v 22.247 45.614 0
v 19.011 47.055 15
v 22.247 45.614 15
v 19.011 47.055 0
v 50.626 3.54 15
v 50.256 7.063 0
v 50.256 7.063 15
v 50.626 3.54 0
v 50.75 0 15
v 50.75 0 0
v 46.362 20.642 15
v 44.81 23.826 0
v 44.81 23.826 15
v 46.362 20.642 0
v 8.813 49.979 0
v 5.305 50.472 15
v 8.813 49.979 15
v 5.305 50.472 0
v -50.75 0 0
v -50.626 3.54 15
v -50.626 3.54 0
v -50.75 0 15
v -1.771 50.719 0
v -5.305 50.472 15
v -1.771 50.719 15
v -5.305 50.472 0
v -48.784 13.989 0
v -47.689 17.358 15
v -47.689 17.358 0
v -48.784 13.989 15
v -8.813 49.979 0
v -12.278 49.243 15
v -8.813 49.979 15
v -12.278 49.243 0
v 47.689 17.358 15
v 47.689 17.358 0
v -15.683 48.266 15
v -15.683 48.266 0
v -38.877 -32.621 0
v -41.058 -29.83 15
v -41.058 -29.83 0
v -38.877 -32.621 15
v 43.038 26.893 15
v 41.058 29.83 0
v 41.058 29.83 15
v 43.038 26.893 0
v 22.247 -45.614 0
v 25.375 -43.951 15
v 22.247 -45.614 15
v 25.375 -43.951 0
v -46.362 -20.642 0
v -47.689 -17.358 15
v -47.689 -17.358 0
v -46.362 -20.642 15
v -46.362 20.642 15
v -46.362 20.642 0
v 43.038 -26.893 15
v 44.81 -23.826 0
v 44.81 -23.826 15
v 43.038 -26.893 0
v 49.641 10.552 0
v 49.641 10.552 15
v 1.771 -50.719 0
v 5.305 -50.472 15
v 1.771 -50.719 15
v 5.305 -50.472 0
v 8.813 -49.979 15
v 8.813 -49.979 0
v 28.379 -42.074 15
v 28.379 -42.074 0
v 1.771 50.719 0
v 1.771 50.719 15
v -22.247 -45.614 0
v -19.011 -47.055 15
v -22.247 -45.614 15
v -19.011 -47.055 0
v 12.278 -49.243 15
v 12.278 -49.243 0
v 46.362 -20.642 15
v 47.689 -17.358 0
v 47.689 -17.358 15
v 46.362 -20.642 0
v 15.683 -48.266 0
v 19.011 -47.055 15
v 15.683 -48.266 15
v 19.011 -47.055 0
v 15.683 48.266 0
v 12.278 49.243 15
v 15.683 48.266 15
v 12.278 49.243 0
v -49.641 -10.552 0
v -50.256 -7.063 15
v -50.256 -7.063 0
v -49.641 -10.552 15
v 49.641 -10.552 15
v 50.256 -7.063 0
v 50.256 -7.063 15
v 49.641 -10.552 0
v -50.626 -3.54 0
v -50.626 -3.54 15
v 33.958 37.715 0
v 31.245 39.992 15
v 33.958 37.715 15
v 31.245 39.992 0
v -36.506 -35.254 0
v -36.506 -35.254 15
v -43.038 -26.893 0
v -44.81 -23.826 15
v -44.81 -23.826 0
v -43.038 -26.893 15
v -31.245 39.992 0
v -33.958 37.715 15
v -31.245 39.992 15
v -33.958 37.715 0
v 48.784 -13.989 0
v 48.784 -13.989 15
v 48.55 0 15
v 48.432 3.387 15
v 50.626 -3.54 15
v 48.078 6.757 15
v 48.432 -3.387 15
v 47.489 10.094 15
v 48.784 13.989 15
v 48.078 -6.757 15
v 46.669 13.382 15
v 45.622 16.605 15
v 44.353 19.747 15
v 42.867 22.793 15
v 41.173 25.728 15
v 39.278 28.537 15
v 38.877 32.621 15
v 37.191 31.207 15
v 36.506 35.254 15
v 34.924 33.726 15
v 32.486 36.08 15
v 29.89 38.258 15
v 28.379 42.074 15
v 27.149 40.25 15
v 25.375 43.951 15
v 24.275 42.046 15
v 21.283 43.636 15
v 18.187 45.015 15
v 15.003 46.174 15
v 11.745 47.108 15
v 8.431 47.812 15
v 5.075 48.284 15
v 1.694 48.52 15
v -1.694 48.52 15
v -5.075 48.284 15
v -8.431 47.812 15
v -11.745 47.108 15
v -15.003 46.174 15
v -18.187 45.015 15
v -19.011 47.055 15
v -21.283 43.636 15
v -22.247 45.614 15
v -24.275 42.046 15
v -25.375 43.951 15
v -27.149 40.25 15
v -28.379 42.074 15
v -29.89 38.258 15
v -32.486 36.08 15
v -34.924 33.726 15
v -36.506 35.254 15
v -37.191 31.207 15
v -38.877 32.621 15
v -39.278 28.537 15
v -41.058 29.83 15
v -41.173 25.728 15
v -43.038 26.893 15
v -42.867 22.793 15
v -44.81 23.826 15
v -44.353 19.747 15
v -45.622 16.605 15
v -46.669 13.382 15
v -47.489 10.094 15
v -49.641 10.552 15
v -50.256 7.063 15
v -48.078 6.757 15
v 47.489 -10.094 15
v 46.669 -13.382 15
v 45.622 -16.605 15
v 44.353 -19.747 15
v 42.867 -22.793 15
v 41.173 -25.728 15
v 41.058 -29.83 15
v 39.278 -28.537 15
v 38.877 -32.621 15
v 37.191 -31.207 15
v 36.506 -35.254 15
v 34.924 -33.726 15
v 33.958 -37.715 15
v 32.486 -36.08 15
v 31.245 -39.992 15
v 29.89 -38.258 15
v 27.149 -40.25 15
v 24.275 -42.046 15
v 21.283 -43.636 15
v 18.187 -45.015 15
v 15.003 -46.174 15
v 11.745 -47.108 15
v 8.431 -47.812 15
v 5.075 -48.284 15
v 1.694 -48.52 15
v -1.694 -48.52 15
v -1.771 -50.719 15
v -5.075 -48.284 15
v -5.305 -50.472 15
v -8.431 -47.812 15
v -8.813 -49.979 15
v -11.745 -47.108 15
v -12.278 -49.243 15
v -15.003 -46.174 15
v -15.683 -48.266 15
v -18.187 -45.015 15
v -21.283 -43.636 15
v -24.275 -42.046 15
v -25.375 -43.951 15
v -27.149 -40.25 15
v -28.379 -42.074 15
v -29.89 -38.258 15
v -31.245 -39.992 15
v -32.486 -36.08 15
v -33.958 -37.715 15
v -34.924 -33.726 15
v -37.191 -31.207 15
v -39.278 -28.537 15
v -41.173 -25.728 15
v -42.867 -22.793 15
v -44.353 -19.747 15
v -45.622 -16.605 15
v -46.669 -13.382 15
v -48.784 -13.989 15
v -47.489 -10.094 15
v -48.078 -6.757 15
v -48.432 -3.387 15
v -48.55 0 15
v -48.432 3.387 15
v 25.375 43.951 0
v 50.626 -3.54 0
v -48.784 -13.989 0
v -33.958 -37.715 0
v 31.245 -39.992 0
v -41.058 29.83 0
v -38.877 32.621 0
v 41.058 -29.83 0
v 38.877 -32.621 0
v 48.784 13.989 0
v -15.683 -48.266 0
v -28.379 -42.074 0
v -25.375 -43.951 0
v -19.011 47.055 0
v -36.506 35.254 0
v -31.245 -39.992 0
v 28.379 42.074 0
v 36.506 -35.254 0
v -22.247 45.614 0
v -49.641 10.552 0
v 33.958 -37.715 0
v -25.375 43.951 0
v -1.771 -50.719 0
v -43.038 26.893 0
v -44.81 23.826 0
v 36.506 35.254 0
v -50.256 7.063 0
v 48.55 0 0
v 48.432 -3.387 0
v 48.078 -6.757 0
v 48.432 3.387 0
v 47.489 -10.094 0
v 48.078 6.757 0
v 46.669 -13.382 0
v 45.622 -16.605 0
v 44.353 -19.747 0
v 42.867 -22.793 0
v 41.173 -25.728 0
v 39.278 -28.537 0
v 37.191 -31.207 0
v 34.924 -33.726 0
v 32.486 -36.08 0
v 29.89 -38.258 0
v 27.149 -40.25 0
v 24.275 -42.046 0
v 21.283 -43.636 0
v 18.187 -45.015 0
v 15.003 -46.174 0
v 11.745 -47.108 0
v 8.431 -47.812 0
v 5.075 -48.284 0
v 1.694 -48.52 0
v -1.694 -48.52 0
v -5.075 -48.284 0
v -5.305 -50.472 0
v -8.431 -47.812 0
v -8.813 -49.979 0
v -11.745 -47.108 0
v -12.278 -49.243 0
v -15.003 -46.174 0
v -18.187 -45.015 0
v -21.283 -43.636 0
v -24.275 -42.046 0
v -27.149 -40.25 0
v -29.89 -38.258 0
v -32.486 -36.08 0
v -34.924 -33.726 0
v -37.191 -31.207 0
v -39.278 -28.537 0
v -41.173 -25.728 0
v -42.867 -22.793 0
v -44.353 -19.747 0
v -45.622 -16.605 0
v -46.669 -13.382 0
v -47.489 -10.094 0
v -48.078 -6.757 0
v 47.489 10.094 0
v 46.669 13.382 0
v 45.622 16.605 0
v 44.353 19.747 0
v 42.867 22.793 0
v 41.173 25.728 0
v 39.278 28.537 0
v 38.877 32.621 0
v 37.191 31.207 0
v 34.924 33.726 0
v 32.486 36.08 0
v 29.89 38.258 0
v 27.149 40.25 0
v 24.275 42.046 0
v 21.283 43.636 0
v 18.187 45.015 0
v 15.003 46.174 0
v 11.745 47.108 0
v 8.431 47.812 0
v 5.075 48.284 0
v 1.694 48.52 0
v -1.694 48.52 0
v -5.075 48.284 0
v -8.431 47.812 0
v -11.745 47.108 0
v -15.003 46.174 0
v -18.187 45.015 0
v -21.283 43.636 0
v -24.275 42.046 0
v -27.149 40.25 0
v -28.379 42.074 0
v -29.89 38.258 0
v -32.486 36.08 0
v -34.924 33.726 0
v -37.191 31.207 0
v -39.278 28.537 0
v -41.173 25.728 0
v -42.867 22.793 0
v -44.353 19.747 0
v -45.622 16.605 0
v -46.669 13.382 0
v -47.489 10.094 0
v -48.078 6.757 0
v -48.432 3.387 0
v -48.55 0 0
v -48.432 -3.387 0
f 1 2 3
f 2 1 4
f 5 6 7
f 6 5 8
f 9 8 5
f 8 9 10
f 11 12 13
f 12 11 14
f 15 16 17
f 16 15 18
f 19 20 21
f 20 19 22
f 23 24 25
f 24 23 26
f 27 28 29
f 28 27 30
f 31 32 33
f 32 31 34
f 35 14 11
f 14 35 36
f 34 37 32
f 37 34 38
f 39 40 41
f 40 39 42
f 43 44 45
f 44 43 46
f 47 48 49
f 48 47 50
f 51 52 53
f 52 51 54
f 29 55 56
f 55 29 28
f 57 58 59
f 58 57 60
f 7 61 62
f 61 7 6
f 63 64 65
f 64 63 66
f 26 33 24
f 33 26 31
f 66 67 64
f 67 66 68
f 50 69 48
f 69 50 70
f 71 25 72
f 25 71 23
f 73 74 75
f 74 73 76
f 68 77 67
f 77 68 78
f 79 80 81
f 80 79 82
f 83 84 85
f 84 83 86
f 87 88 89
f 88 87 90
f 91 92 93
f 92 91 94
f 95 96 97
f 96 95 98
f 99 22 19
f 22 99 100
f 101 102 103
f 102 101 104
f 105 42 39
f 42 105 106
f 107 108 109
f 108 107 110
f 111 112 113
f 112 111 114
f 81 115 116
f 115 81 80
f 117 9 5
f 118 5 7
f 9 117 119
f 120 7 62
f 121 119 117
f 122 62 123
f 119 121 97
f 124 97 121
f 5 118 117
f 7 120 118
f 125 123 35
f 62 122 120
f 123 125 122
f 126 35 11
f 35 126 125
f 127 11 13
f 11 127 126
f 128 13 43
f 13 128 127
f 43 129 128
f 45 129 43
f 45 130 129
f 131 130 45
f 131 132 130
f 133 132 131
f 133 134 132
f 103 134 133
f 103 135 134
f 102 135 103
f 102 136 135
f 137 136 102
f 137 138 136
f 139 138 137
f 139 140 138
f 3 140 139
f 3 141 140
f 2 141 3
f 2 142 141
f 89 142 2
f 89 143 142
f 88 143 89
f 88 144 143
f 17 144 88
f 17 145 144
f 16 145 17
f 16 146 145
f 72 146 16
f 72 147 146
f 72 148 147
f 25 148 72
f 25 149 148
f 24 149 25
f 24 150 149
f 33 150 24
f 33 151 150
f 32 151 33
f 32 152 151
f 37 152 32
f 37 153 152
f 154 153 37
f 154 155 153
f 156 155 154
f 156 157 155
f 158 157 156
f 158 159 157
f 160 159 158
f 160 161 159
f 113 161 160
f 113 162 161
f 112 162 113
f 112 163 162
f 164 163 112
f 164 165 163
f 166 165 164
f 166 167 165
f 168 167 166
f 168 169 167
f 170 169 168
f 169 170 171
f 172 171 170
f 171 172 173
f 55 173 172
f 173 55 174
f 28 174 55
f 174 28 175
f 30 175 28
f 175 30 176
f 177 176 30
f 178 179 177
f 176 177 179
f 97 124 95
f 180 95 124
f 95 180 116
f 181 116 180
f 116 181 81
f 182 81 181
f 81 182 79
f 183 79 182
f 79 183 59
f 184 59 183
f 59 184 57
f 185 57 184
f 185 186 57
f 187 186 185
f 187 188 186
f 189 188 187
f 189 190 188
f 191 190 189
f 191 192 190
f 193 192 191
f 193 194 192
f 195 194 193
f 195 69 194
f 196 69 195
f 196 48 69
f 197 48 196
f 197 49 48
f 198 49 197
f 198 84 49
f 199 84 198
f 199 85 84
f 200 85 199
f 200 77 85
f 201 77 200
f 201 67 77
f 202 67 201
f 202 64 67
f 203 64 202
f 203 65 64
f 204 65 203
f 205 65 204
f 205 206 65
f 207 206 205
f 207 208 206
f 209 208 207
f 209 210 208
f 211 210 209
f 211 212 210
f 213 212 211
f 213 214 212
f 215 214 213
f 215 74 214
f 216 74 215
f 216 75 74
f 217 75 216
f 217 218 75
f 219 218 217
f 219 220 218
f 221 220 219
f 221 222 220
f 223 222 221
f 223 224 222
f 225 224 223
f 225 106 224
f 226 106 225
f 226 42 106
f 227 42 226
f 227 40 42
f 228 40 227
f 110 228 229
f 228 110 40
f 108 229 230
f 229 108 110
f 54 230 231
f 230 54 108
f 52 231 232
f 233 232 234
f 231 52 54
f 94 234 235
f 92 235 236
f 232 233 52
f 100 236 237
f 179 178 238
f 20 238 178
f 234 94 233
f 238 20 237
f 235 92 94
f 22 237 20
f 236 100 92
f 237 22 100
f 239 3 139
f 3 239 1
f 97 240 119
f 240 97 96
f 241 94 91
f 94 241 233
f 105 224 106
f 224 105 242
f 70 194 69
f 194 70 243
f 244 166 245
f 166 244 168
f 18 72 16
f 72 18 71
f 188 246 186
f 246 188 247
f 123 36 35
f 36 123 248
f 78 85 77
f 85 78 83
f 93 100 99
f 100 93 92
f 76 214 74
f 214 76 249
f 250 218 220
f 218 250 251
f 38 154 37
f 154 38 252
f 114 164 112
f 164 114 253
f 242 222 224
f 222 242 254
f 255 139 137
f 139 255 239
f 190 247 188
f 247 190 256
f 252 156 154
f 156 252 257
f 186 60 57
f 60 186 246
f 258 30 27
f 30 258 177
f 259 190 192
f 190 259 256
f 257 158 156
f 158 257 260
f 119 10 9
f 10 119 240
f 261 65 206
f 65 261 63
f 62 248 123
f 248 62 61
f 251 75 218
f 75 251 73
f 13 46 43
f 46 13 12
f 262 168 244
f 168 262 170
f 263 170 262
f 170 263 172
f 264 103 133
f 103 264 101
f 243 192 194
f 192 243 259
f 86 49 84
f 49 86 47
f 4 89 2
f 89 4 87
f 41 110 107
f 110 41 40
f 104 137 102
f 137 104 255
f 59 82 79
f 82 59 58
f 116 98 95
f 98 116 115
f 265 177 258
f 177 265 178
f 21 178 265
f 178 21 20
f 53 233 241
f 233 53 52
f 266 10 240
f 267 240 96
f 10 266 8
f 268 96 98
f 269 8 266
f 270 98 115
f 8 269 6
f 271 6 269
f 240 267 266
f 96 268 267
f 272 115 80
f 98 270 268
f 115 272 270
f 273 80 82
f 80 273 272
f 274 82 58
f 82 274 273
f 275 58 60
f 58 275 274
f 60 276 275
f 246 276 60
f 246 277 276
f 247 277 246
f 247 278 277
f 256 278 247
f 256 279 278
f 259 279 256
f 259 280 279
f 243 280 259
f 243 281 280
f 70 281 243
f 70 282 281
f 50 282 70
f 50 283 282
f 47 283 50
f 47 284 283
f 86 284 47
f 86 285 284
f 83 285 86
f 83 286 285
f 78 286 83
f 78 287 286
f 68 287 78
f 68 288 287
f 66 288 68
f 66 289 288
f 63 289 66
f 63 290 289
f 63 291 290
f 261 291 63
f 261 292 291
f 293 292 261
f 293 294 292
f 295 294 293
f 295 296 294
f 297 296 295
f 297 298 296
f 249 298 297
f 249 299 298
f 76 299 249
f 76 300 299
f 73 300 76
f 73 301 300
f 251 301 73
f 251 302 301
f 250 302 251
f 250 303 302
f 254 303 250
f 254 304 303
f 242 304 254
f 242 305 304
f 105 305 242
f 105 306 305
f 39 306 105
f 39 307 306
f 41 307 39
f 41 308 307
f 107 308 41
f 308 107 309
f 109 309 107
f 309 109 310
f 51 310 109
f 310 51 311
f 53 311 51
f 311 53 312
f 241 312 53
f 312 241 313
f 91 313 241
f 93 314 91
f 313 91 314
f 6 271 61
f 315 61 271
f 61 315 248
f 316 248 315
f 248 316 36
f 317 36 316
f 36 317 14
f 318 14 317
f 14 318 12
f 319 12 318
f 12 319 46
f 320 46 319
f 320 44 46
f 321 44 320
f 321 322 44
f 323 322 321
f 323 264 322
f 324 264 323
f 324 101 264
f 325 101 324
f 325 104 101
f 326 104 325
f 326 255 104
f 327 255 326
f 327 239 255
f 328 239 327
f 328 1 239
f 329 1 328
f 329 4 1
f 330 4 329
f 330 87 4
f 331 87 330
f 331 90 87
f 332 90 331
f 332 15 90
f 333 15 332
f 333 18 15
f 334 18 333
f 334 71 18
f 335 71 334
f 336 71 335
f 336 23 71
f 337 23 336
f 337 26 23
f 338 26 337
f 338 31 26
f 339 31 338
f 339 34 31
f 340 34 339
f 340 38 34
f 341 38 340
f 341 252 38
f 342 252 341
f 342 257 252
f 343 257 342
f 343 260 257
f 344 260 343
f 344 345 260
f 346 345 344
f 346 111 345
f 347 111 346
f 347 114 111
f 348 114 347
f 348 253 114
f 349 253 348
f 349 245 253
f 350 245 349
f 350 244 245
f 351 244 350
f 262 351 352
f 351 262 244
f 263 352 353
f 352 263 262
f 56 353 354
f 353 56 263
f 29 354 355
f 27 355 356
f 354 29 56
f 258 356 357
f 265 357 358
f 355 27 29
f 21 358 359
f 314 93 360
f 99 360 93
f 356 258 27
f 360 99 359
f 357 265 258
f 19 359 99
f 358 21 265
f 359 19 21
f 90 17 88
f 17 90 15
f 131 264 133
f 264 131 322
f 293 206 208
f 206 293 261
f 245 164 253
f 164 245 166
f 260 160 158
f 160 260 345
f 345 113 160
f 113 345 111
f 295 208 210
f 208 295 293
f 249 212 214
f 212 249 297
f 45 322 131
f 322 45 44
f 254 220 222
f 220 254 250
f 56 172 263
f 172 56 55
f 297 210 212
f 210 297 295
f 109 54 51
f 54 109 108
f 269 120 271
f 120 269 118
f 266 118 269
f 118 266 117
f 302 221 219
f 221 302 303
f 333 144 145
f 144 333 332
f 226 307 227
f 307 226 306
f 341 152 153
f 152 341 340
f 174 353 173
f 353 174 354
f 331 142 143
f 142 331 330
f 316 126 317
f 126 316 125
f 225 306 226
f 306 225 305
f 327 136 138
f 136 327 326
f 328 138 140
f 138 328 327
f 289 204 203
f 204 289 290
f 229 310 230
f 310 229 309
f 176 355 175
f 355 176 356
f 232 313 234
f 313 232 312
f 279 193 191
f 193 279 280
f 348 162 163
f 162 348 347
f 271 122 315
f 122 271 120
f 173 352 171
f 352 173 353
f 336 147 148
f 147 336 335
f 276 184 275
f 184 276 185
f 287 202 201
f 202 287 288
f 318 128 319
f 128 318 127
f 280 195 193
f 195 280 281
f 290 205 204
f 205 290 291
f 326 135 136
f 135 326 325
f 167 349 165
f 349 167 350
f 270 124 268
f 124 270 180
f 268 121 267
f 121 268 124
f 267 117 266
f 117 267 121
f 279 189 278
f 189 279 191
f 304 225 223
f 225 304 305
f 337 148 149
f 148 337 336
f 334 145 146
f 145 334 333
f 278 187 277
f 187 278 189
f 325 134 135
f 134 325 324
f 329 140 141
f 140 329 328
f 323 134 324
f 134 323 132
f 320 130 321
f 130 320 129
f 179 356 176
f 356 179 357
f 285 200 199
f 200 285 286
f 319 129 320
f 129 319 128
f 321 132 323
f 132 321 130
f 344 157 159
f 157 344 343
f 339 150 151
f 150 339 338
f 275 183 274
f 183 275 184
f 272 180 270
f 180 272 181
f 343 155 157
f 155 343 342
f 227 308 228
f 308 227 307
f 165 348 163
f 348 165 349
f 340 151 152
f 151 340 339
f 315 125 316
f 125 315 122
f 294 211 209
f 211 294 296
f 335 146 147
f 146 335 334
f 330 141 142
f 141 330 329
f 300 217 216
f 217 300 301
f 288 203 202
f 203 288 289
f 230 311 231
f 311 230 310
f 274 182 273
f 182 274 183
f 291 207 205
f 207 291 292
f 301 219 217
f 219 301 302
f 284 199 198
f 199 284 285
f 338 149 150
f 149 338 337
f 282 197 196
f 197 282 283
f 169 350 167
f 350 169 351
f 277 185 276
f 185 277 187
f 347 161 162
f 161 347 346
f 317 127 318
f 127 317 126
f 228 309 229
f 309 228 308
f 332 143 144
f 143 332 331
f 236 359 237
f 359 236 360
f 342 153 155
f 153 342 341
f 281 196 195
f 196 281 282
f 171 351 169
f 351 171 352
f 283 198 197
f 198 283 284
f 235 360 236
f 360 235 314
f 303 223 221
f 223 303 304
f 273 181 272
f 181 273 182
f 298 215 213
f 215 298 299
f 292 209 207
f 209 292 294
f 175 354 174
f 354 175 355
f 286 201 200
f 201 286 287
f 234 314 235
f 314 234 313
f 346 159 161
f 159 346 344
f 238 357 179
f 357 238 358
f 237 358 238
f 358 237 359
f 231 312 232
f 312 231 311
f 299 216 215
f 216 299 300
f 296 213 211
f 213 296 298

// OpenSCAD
// ***********************************
// Project: 3D Printed Rocket
// Filename: PeregrineNoseCone.scad
// for Apogee Peregrine (100mm body tube)
// Created: 2025-01-19
// Units: mm
// ***********************************
//
// Designed for Bambu P1S (256x256x256mm build volume)
// Two-piece printing supported for lengths > 250mm
//
// ***********************************

include<NoseCone.scad>

// ============================================
// BODY TUBE — measure yours and adjust
// ============================================
Peregrine_Body_OD    = 101.5;   // outside diameter of body tube
Peregrine_Body_ID    = 99.0;    // inside diameter of body tube
Peregrine_Coupler_OD = 97.1;    // shell ID = Body_OD - 2*Wall_T

// ============================================
// NOSE CONE — 550mm exposed, 5.42:1 ogive
// ============================================
// Exposed height = NC_Base_L + NC_Length - X0 + NC_Tip_R.
// The +NC_Tip_R term matters: Tip_Z in BluntOgiveNoseCone is the tip
// SPHERE CENTRE, not the apex. NC_Length=574.55 gives exactly 550.
NC_Length  = 574.55;
NC_Base_L  = 15;
NC_Tip_R   = 8;
NC_Wall_T  = 2.2;
NC_nRivets = 0;   // shoulder is glued via its spigot, not pinned

// Slice planes. Cut_d is a DIAMETER; the module derives Z from it.
Cut1_d = 92.85;   // -> Z = 183.33
Cut2_d = 63.66;   // -> Z = 366.67
Cut1_Z = 183.33;  // clip plane for the middle slice

// ============================================
// SHOULDER — stepped, printed, all-in-one
// ============================================
// Body enters the tube (99.0 ID), spigot enters the shell (97.1 ID).
// Both clearances are 0.4mm diametral.
Shoulder_L         = 100;    // length inside the body tube
// Derived from the body tube ID so a re-measured tube (line 20) can never
// silently produce an interference fit here: 0.4mm diametral clearance.
Shoulder_OD        = Peregrine_Body_ID - 0.4;
Shoulder_Spigot_L  = 15;     // length inside the nosecone skirt
Shoulder_Spigot_OD = 96.7;
Shoulder_Bulk_T    = 4;      // bulkhead thickness, carries the anchor

// ============================================
// GUIDE RINGS — keep the strap off the shell
// ============================================
// OD is the measured flange bore less 0.4-0.5mm diametral clearance.
// Flange bores: 82.47 at joint 1, 52.41 at joint 2.
Ring_T     = 6;
Ring1_OD   = 82.0;
Ring2_OD   = 52.0;
Ring_Eye_d = 12;   // strap pass-through
Ring_Wall  = 4;

// ============================================
// RENDER SELECTION — change this value!
// ============================================
// 0 = Test ring (print first!)
// 1 = Shoulder + bulkhead + parachute anchor
// 2 = Bottom slice
// 3 = Middle slice
// 4 = Top slice (filled tip)
// 5 = Guide ring, lower
// 6 = Guide ring, upper
Render_Part = 0;

// ============================================
// PARTS
// ============================================
module NC_Slice_Bottom(){
    BluntOgiveNoseCone(ID=Peregrine_Coupler_OD, OD=Peregrine_Body_OD,
        L=NC_Length, Base_L=NC_Base_L, nRivets=NC_nRivets,
        Tip_R=NC_Tip_R, Wall_T=NC_Wall_T,
        Cut_d=Cut1_d, LowerPortion=true);
} // NC_Slice_Bottom

module NC_Slice_Middle(){
    // Everything below cut 2 (with its gluing flange), clipped above cut 1.
    // The clean lower cut slides over the bottom slice's flange.
    intersection(){
        BluntOgiveNoseCone(ID=Peregrine_Coupler_OD, OD=Peregrine_Body_OD,
            L=NC_Length, Base_L=NC_Base_L, nRivets=NC_nRivets,
            Tip_R=NC_Tip_R, Wall_T=NC_Wall_T,
            Cut_d=Cut2_d, LowerPortion=true);

        translate([0,0,Cut1_Z])
            cylinder(d=Peregrine_Body_OD+2, h=NC_Length, $fn=$preview? 90:360);
    } // intersection
} // NC_Slice_Middle

module NC_Slice_Top(){
    BluntOgiveNoseCone(ID=Peregrine_Coupler_OD, OD=Peregrine_Body_OD,
        L=NC_Length, Base_L=NC_Base_L, nRivets=NC_nRivets,
        Tip_R=NC_Tip_R, Wall_T=NC_Wall_T,
        Cut_d=Cut2_d, LowerPortion=false, FillTip=true);
} // NC_Slice_Top

module NC_Shoulder(){
    // Printed replacement for a bought coupler. The bulkhead is the
    // parachute anchor: shock passes straight into the body tube, so no
    // glue joint is ever loaded in tension.
    difference(){
        union(){
            cylinder(d=Shoulder_OD, h=Shoulder_L, $fn=$preview? 90:360);

            translate([0,0,Shoulder_L])
                cylinder(d=Shoulder_Spigot_OD, h=Shoulder_Spigot_L,
                         $fn=$preview? 90:360);
        } // union

        // Hollow the body, leaving the bulkhead at the bottom
        translate([0,0,Shoulder_Bulk_T])
            cylinder(d=Shoulder_OD-NC_Wall_T*2,
                     h=Shoulder_L-Shoulder_Bulk_T+Overlap,
                     $fn=$preview? 90:360);

        // Hollow the spigot separately so its wall stays NC_Wall_T
        translate([0,0,Shoulder_L])
            cylinder(d=Shoulder_Spigot_OD-NC_Wall_T*2,
                     h=Shoulder_Spigot_L+Overlap, $fn=$preview? 90:360);

        // Strap slots — printed anchor, no metal hardware
        translate([0, Shoulder_OD/2-NC_Wall_T-4, -Overlap])
            RoundRect(X=16, Y=4, Z=Shoulder_Bulk_T+1, R=1.5);
        translate([0, -Shoulder_OD/2+NC_Wall_T+4, -Overlap])
            RoundRect(X=16, Y=4, Z=Shoulder_Bulk_T+1, R=1.5);
    } // difference
} // NC_Shoulder

module NC_GuideRing(OD=Ring1_OD){
    // Annulus + 3 spokes + central eyelet. A solid disc would add ~39g
    // at joint 1 and block the cone interior.
    intersection(){
        difference(){
            union(){
                difference(){
                    cylinder(d=OD, h=Ring_T, $fn=$preview? 90:360);
                    translate([0,0,-Overlap])
                        cylinder(d=OD-Ring_Wall*2, h=Ring_T+Overlap*2,
                                 $fn=$preview? 90:360);
                } // difference

                difference(){
                    cylinder(d=Ring_Eye_d+Ring_Wall*2, h=Ring_T, $fn=$preview? 90:180);
                    translate([0,0,-Overlap])
                        cylinder(d=Ring_Eye_d, h=Ring_T+Overlap*2, $fn=$preview? 90:180);
                } // difference

                for (j=[0:2]) rotate([0,0,120*j])
                    translate([0,-Ring_Wall/2,0]) cube([OD/2, Ring_Wall, Ring_T]);
            } // union

            // Spokes cross the axis, so the eyelet bore must be cut AFTER
            // they are unioned or the strap hole is webbed shut.
            translate([0,0,-Overlap])
                cylinder(d=Ring_Eye_d, h=Ring_T+Overlap*2, $fn=$preview? 90:180);
        } // difference

        // Clamp to OD: the spoke cube corners otherwise reach
        // sqrt((OD/2)^2+(Ring_Wall/2)^2), eating the flange clearance.
        translate([0,0,-Overlap])
            cylinder(d=OD, h=Ring_T+Overlap*2, $fn=$preview? 90:360);
    } // intersection
} // NC_GuideRing

// ============================================
// RENDERING LOGIC — don't edit below
// ============================================
if (Render_Part == 0) TestRing();
if (Render_Part == 1) NC_Shoulder();
if (Render_Part == 2) NC_Slice_Bottom();
if (Render_Part == 3) NC_Slice_Middle();
if (Render_Part == 4) NC_Slice_Top();
if (Render_Part == 5) NC_GuideRing(OD=Ring1_OD);
if (Render_Part == 6) NC_GuideRing(OD=Ring2_OD);

module TestRing(){
    // Print this FIRST. Verifies both fits before committing to 190mm parts.
    // OD must sit flush on the body tube (no step).
    // Bore must accept the shoulder spigot (96.7) with a light push fit.
    difference(){
        cylinder(d=Peregrine_Body_OD, h=15, $fn=90);
        translate([0,0,-Overlap])
            cylinder(d=Peregrine_Coupler_OD, h=15+Overlap*2, $fn=90);
    } // difference
} // TestRing

// ============================================
// PRINT NOTES
// ============================================
//
// Parts (all 3D printed):
//   0  Test ring          15mm    -- disposable fit check. Print FIRST,
//                                     verify both fits, then set aside --
//                                     it is NOT glued into the assembly.
//   1  Shoulder          115mm    -- superglued into the assembly
//   2  Bottom slice      190mm    -- superglued into the assembly
//   3  Middle slice      190mm    -- superglued into the assembly
//   4  Top slice         183mm    -- superglued into the assembly
//   5  Guide ring lower    6mm    -- superglued into the assembly (optional)
//   6  Guide ring upper    6mm    -- superglued into the assembly (optional)
//
// Parts 3 and 4 EXPORT starting at z=183.33 and z=366.67 (not z=0) --
// drop them to the build plate in the slicer before printing.
//
// Guide rings 5 and 6 keep the parachute strap off the shell wall while
// it is packed up INSIDE the cone. If the parachute instead packs below
// the nosecone, in the body tube, the rings serve no purpose -- skip
// parts 5 and 6 and glue joints 1 and 2 directly.
//
// Each flange bore is NARROWEST right at its own rim and WIDENS going
// down into the open cone below it. A ring set in loose will not catch
// there -- it slides straight down past the flange and keeps going until
// it reaches the shoulder bulkhead, far below. Every ring must be GLUED
// into its flange bore and HELD in place until the glue sets; it will
// not stay there by itself.
//
// Assembly, bottom to top. Thread the strap and seat each ring BEFORE
// closing the joint above it, never after -- once a joint is glued shut,
// its far side is a sealed cavity and nothing can be threaded into it:
//   1. Thread the parachute strap through the shoulder's bulkhead slots.
//   2. Glue the shoulder spigot into the bottom slice bore. Hold until set.
//   3. Feed the strap up through ring 5's eyelet, seat the ring in the
//      bottom slice's joint-1 flange bore, glue, and hold until set.
//   4. Glue the middle slice onto the bottom slice's flange, closing
//      joint 1. Ring 5 and the strap are now sealed inside, already
//      threaded correctly.
//   5. Feed the strap up through ring 6's eyelet, seat the ring in the
//      middle slice's joint-2 flange bore, glue, and hold until set.
//   6. Glue the top slice onto the middle slice's flange, closing joint 2.
// (If skipping the rings per above, just glue each joint directly and
// thread the strap through the bulkhead slots only.)
//
// Use gel CA or a slow epoxy, not thin/wicking CA. The laps are large
// (1935mm^2 at joint 1) with only a ~0.2mm radial gap, and thin CA kicks
// on contact -- it gives you one shot at alignment on a 190mm-long part.
//
// Print settings: 3 perimeters, 15% infill, PETG or ASA.
// Total ~508g in PETG.
//
// ALWAYS export with F6 (full render). F5 preview applies a quarter
// cutaway and will silently export a broken part.
//
// ***********************************
